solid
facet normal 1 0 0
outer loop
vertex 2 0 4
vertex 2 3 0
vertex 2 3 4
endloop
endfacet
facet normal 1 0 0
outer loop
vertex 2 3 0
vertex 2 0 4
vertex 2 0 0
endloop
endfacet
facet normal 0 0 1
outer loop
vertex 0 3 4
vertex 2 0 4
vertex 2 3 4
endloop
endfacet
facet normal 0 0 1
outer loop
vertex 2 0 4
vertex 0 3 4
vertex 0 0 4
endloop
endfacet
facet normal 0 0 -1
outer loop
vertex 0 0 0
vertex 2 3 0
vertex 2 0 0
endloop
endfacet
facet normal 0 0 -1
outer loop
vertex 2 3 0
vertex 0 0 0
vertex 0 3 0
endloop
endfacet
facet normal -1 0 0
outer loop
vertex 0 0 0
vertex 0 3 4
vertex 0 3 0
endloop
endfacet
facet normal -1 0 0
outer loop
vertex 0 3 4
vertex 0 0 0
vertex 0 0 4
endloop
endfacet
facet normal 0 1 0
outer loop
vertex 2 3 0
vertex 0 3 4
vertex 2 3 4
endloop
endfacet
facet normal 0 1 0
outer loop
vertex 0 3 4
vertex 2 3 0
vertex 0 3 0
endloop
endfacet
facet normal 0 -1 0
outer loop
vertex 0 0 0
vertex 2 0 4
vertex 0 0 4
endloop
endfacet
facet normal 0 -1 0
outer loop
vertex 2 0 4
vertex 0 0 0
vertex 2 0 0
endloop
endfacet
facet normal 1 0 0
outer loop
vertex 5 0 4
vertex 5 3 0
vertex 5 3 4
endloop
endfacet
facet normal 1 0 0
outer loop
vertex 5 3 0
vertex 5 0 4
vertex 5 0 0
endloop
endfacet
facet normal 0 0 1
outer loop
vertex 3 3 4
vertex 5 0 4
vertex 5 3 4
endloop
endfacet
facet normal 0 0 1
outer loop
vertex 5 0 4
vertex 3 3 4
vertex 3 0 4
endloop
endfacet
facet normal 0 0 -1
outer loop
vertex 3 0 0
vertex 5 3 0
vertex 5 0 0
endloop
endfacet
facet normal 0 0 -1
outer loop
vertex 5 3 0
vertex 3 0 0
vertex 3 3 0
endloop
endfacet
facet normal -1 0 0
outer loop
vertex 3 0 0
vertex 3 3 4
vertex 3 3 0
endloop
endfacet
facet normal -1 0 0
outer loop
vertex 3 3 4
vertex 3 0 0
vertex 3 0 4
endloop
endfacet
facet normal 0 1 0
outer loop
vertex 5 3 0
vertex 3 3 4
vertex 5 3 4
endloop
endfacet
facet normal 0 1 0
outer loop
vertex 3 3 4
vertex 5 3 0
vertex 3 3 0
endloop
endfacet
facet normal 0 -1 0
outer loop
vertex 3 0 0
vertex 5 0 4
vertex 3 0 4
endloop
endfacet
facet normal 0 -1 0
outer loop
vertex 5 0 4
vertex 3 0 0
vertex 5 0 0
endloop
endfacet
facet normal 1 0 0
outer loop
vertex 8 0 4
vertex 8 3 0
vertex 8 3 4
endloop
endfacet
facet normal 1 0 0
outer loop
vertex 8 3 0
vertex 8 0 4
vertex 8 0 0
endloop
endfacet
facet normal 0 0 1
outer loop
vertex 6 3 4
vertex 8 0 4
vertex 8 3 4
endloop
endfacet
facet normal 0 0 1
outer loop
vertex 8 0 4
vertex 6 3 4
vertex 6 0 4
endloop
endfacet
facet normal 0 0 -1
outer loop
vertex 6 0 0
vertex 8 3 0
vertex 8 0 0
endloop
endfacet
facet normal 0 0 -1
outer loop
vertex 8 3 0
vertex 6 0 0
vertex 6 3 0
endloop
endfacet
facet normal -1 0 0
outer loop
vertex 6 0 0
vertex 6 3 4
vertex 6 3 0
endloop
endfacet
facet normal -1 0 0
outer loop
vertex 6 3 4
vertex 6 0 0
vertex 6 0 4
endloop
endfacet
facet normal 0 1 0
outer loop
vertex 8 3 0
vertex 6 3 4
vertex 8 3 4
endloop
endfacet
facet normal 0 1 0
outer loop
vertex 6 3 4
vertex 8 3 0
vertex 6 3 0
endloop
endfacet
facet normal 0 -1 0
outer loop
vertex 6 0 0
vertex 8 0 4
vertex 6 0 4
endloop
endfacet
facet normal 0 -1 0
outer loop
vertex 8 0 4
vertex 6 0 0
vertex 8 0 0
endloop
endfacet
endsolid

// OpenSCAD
// See http://en.wikibooks.org/wiki/OpenSCAD_User_Manual

// Changing the colors only works in Preview mode (F5). Render mode (F6) does not currently support color.

color([1,0,0]) cube([2,3,4]);
translate([3,0,0])
color([0,1,0]) cube([2,3,4]);
translate([6,0,0])
color([0,0,1]) cube([2,3,4]);
